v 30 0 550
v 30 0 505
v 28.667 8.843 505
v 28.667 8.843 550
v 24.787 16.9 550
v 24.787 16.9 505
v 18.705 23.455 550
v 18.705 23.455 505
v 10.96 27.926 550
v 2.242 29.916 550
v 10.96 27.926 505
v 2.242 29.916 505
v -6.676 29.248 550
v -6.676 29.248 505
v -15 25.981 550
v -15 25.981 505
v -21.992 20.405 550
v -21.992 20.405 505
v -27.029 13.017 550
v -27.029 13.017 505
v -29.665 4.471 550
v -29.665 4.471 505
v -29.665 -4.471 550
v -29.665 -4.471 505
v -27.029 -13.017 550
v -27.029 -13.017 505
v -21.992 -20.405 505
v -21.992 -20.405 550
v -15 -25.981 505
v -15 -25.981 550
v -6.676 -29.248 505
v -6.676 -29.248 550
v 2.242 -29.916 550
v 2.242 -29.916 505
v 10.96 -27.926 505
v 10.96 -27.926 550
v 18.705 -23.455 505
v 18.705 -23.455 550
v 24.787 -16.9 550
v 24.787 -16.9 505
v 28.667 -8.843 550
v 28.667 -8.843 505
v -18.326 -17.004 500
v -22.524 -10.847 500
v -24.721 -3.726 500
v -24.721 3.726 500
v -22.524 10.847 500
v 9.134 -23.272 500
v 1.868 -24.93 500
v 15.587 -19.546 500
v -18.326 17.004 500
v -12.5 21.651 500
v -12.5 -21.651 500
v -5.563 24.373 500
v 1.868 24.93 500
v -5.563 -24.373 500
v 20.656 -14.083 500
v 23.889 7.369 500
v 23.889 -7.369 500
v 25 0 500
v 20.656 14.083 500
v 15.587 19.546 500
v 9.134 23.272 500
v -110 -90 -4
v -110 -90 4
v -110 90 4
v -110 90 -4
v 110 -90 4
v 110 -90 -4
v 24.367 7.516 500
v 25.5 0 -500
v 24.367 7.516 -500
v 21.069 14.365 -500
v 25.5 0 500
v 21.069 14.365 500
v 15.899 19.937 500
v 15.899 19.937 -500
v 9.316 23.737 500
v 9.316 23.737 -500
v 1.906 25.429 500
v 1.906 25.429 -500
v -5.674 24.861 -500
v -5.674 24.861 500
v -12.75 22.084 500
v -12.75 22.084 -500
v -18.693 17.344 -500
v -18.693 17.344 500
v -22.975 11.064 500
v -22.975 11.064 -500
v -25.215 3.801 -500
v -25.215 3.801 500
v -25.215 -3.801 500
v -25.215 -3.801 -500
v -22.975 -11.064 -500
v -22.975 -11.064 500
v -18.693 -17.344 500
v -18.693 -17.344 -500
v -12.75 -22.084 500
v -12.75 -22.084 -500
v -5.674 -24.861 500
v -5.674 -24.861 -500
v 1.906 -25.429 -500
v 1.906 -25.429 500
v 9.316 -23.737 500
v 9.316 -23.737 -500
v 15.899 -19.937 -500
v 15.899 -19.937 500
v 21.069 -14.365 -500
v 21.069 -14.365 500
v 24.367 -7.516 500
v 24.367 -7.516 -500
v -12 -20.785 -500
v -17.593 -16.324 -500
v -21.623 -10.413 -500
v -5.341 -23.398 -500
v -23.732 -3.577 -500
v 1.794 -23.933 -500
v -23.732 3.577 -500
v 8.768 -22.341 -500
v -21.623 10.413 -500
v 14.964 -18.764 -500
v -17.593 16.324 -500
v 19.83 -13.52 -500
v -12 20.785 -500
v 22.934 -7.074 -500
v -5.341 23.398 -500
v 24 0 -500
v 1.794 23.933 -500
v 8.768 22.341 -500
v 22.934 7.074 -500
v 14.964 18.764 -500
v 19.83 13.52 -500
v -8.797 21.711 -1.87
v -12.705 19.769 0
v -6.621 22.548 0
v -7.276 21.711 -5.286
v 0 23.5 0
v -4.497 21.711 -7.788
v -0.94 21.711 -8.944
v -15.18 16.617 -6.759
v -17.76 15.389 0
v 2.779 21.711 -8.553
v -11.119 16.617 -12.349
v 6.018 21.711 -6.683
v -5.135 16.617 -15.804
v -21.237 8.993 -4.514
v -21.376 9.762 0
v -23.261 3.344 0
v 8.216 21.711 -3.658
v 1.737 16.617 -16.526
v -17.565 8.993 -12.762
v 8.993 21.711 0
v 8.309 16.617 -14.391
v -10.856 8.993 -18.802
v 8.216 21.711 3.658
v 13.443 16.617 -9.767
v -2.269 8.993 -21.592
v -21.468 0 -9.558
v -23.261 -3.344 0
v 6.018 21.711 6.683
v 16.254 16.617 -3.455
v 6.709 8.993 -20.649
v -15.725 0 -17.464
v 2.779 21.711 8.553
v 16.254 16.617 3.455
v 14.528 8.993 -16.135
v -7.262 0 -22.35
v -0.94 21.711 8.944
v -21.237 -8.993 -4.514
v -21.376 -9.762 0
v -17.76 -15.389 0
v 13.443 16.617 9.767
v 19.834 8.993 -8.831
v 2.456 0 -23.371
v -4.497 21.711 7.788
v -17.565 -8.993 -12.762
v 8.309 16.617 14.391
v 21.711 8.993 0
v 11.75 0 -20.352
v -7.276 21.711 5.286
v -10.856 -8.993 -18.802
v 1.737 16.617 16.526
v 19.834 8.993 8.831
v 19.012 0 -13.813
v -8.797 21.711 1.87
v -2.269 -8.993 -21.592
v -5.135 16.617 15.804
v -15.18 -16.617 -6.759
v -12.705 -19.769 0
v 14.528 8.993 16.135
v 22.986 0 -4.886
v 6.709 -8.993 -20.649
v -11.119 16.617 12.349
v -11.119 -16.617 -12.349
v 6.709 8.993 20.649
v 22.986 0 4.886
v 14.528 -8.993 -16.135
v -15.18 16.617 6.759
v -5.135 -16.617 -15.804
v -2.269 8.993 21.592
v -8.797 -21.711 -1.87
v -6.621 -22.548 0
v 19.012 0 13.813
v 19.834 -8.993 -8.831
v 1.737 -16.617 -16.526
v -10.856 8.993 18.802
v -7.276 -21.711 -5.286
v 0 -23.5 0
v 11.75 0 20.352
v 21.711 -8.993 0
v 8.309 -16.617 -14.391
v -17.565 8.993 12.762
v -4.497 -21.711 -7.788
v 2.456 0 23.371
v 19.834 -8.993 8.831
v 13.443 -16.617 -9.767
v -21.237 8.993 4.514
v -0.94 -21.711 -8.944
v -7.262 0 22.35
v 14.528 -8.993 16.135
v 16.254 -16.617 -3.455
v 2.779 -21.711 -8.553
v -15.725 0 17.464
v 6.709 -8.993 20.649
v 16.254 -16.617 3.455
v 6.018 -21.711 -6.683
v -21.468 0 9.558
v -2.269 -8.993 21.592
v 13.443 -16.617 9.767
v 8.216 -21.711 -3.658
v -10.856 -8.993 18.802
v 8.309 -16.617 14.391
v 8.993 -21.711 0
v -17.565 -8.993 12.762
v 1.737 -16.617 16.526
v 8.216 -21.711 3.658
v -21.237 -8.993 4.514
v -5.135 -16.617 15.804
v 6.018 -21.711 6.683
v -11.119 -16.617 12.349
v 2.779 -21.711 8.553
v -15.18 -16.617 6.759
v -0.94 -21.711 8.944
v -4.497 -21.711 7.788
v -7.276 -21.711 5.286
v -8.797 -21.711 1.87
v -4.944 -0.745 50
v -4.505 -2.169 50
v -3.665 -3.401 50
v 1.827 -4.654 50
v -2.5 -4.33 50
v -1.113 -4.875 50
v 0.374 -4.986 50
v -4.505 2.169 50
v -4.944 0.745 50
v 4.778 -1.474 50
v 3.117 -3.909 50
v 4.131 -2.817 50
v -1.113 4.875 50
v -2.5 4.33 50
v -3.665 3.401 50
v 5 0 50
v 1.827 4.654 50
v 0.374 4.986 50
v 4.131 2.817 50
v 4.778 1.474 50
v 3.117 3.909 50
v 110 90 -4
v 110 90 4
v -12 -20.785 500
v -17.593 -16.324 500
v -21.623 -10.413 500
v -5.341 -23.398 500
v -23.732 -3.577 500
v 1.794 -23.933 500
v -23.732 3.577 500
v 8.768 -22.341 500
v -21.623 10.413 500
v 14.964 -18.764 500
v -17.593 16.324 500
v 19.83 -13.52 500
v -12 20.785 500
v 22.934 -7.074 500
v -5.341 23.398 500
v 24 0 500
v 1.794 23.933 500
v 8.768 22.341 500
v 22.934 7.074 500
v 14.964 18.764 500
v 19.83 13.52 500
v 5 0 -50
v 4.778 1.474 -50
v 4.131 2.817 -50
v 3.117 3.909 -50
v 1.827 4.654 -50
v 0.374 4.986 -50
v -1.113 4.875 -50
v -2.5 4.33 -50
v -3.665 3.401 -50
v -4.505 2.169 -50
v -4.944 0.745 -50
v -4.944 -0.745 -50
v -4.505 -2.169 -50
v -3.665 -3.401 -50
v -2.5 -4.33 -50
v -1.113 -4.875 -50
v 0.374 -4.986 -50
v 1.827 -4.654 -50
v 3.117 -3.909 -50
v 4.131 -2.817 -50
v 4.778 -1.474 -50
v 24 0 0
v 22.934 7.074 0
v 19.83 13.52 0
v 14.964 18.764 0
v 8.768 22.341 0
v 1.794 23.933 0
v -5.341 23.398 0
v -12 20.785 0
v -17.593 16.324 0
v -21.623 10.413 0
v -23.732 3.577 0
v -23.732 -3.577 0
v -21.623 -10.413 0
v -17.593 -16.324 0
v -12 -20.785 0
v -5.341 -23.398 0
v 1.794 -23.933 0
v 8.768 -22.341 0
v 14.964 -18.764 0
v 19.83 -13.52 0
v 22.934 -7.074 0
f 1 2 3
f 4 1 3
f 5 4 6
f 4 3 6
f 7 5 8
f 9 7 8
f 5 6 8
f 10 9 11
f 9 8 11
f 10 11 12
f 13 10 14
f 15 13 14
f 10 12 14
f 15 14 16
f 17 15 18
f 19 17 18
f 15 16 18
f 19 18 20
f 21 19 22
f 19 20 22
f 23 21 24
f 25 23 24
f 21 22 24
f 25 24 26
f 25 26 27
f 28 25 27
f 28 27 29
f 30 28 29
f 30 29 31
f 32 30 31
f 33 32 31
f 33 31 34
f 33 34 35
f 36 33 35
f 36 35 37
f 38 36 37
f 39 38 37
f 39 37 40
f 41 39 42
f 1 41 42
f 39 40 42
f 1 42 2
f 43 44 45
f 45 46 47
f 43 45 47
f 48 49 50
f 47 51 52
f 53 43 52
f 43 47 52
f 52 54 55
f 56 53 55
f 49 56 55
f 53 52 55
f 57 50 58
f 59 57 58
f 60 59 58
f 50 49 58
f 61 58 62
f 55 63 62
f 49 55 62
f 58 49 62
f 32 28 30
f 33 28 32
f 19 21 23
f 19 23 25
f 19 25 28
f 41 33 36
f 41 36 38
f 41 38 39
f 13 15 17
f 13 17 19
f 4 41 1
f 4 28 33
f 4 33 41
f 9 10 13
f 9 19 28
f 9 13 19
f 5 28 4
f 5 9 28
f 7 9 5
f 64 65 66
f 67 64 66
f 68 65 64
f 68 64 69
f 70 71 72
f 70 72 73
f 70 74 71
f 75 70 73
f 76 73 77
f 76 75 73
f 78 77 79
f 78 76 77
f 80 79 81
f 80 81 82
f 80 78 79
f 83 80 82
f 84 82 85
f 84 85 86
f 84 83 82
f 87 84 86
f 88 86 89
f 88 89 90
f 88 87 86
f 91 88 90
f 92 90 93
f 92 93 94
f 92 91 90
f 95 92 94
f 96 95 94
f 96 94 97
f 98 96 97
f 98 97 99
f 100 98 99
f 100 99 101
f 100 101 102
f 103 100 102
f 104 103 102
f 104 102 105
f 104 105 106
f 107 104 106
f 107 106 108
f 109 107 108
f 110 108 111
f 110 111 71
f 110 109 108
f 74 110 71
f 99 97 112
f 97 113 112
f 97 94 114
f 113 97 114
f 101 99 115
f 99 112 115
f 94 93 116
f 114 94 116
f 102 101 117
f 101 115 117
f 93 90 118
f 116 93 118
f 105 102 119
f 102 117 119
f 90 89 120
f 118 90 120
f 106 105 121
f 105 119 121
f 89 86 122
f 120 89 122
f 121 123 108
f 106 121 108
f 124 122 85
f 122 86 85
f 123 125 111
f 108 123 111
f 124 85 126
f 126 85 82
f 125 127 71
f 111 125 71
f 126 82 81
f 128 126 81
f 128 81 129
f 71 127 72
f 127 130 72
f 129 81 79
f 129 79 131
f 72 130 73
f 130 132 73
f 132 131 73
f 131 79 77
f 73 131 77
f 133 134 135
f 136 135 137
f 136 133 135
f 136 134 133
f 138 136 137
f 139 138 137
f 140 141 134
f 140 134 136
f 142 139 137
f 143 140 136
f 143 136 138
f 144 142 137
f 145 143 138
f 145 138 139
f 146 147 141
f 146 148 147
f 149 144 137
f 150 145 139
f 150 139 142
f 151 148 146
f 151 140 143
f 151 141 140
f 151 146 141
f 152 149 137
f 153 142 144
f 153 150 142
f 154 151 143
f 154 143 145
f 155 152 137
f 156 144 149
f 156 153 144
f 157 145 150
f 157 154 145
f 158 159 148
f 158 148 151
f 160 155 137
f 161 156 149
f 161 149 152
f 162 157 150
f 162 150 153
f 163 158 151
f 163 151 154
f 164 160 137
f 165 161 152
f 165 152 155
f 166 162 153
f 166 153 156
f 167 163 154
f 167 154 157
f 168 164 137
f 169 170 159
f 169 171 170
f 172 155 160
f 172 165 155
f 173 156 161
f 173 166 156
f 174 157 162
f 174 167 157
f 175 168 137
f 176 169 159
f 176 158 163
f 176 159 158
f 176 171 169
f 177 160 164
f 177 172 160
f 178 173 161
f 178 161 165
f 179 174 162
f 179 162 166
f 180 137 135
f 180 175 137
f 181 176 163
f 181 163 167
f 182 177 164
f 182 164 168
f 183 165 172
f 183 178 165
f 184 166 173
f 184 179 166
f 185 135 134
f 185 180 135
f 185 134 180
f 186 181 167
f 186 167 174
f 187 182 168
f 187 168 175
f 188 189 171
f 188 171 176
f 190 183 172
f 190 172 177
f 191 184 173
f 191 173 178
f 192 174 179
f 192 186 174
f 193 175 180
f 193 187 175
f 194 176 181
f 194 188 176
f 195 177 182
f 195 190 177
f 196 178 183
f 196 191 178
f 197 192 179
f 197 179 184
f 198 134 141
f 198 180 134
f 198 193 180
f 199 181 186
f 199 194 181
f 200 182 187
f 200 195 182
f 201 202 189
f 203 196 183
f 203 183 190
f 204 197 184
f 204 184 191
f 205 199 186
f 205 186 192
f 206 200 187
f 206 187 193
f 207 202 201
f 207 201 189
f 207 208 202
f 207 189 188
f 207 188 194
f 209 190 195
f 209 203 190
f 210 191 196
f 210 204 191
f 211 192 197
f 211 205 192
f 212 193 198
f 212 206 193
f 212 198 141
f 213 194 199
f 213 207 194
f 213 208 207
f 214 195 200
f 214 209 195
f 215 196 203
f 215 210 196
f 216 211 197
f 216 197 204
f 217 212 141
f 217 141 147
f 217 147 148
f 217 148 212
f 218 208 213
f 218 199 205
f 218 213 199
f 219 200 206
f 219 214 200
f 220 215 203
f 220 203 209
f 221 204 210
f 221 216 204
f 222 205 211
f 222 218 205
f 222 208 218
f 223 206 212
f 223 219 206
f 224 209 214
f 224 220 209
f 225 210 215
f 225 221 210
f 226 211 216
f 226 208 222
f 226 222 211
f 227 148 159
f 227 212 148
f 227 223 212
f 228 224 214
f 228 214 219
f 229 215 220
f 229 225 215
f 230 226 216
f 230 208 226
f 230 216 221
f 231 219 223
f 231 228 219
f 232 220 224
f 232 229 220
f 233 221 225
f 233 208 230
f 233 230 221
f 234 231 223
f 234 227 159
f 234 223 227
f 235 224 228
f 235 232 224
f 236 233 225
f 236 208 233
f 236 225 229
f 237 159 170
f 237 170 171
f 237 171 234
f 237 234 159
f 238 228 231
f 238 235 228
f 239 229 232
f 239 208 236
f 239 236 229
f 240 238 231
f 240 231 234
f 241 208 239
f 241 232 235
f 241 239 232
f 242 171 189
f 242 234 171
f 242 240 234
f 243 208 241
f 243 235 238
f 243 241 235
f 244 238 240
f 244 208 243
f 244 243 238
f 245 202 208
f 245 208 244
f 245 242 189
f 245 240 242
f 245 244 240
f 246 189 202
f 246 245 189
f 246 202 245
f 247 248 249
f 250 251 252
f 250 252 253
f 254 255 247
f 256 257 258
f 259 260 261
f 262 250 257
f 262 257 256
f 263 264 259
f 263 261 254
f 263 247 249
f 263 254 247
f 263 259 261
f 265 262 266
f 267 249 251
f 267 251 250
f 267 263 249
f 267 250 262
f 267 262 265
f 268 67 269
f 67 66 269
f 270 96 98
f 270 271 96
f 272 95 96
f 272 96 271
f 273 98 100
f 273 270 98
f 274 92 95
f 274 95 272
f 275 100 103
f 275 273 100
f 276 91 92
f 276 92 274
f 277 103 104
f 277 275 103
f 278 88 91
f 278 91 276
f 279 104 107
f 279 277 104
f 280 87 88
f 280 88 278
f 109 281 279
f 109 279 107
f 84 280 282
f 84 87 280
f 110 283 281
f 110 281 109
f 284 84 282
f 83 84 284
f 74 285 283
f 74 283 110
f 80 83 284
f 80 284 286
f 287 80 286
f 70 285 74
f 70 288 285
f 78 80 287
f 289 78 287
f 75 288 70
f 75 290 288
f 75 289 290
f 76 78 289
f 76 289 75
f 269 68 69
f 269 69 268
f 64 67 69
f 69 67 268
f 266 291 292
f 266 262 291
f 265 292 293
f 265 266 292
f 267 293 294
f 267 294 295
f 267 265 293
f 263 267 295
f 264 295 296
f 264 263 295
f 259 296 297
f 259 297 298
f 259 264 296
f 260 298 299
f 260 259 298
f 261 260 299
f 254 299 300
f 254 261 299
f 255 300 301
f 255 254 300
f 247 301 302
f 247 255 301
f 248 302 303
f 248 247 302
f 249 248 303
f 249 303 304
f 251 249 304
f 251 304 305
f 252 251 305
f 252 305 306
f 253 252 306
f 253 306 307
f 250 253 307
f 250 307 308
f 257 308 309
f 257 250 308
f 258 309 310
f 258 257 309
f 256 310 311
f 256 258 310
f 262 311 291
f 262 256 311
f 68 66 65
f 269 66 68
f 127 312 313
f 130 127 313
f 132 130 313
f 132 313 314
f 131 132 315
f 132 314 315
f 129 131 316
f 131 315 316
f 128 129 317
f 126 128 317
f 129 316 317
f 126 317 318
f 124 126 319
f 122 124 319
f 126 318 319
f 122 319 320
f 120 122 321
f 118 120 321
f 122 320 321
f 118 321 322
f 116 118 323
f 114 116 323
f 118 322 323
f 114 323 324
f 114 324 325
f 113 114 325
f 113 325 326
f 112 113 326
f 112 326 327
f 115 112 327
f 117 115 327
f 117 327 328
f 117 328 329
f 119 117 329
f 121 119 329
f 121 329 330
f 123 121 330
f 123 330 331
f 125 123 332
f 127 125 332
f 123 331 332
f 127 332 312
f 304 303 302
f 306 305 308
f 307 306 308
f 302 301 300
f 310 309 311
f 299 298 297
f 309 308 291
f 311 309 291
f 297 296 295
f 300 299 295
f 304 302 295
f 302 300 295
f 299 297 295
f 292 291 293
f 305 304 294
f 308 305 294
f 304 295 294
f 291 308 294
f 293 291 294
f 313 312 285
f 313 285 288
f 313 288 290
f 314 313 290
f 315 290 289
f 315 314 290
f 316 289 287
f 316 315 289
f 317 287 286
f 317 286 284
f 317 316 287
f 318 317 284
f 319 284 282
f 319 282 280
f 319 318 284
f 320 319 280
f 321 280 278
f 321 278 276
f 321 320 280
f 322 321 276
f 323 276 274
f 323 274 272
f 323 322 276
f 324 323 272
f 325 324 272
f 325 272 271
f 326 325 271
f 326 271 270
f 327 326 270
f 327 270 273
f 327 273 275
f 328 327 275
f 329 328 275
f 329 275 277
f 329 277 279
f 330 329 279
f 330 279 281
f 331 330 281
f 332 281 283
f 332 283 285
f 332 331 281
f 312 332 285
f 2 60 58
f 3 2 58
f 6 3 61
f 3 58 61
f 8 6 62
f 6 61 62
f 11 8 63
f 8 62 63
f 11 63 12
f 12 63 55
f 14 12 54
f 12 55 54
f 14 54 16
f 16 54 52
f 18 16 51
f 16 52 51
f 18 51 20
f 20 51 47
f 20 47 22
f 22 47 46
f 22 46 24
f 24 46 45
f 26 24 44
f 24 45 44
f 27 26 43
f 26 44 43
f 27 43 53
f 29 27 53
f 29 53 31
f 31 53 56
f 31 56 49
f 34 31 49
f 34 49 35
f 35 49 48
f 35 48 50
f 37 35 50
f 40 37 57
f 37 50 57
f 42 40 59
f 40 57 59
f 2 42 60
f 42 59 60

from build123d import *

# Parameters (mm, degrees)
F0_W          = 220
F0_H          = 180
F1_DEPTH      = 4
F1_DEPTH_BACK = 4
F2_R          = 5
F3_DEPTH      = 50
F3_DEPTH_BACK = 50
F4_R          = 25.5
F4_R_2        = 24
F5_DEPTH      = 500
F5_DEPTH_BACK = 500
F6_R          = 30
F6_R_2        = 25.5
F6_R_3        = 24
F7_DEPTH      = 50
F8_SIZE       = 5


with BuildPart() as f1:
    # F0 (on Top) → F1 (new body, two sides)
    with BuildSketch(Plane.XY) as f1_sk:
        Rectangle(F0_W, F0_H)
    extrude(amount=F1_DEPTH)
    extrude(f1_sk.sketch, amount=-F1_DEPTH_BACK)


with BuildPart() as f3:
    # F2 (on Top) → F3 (new body, two sides)
    with BuildSketch(Plane.XY) as f3_sk:
        Circle(F2_R)
    extrude(amount=F3_DEPTH)
    extrude(f3_sk.sketch, amount=-F3_DEPTH_BACK)


with BuildPart() as f5:
    # F4 (on Top) → F5 (new body, two sides)
    with BuildSketch(Plane.XY) as f5_sk:
        Circle(F4_R)
        Circle(F4_R_2, mode=Mode.SUBTRACT)
    extrude(amount=F5_DEPTH)
    extrude(f5_sk.sketch, amount=-F5_DEPTH_BACK)


with BuildPart() as f7:
    # F6 (on face) → F7 (new body)
    with BuildSketch(Plane.XY.offset(500)):
        Circle(F6_R)
        Circle(F6_R_2, mode=Mode.SUBTRACT)
        Circle(F6_R_2)
        Circle(F6_R_3, mode=Mode.SUBTRACT)
        Circle(F6_R_3)
    extrude(amount=F7_DEPTH)

    # F8
    f8_edges = [f7.edges().sort_by_distance(p)[0] for p in [
        (-30, 0, 500),
    ]]
    chamfer(f8_edges, length=F8_SIZE)


with BuildPart() as f10:
    # F9 (on Top) → F10 (revolve)
    with BuildSketch(Plane.XY):
        with BuildLine():
            Line((0, 0), (0, 23.5))
            ThreePointArc((0, 23.5), (-23.5, 0), (0, -23.5))
            Line((0, -23.5), (0, 0))
        make_face()
    revolve(axis=Axis((0, 0, 0), (0, -1, 0)))


solid = Compound([f1.part, f3.part, f5.part, f7.part, f10.part])
